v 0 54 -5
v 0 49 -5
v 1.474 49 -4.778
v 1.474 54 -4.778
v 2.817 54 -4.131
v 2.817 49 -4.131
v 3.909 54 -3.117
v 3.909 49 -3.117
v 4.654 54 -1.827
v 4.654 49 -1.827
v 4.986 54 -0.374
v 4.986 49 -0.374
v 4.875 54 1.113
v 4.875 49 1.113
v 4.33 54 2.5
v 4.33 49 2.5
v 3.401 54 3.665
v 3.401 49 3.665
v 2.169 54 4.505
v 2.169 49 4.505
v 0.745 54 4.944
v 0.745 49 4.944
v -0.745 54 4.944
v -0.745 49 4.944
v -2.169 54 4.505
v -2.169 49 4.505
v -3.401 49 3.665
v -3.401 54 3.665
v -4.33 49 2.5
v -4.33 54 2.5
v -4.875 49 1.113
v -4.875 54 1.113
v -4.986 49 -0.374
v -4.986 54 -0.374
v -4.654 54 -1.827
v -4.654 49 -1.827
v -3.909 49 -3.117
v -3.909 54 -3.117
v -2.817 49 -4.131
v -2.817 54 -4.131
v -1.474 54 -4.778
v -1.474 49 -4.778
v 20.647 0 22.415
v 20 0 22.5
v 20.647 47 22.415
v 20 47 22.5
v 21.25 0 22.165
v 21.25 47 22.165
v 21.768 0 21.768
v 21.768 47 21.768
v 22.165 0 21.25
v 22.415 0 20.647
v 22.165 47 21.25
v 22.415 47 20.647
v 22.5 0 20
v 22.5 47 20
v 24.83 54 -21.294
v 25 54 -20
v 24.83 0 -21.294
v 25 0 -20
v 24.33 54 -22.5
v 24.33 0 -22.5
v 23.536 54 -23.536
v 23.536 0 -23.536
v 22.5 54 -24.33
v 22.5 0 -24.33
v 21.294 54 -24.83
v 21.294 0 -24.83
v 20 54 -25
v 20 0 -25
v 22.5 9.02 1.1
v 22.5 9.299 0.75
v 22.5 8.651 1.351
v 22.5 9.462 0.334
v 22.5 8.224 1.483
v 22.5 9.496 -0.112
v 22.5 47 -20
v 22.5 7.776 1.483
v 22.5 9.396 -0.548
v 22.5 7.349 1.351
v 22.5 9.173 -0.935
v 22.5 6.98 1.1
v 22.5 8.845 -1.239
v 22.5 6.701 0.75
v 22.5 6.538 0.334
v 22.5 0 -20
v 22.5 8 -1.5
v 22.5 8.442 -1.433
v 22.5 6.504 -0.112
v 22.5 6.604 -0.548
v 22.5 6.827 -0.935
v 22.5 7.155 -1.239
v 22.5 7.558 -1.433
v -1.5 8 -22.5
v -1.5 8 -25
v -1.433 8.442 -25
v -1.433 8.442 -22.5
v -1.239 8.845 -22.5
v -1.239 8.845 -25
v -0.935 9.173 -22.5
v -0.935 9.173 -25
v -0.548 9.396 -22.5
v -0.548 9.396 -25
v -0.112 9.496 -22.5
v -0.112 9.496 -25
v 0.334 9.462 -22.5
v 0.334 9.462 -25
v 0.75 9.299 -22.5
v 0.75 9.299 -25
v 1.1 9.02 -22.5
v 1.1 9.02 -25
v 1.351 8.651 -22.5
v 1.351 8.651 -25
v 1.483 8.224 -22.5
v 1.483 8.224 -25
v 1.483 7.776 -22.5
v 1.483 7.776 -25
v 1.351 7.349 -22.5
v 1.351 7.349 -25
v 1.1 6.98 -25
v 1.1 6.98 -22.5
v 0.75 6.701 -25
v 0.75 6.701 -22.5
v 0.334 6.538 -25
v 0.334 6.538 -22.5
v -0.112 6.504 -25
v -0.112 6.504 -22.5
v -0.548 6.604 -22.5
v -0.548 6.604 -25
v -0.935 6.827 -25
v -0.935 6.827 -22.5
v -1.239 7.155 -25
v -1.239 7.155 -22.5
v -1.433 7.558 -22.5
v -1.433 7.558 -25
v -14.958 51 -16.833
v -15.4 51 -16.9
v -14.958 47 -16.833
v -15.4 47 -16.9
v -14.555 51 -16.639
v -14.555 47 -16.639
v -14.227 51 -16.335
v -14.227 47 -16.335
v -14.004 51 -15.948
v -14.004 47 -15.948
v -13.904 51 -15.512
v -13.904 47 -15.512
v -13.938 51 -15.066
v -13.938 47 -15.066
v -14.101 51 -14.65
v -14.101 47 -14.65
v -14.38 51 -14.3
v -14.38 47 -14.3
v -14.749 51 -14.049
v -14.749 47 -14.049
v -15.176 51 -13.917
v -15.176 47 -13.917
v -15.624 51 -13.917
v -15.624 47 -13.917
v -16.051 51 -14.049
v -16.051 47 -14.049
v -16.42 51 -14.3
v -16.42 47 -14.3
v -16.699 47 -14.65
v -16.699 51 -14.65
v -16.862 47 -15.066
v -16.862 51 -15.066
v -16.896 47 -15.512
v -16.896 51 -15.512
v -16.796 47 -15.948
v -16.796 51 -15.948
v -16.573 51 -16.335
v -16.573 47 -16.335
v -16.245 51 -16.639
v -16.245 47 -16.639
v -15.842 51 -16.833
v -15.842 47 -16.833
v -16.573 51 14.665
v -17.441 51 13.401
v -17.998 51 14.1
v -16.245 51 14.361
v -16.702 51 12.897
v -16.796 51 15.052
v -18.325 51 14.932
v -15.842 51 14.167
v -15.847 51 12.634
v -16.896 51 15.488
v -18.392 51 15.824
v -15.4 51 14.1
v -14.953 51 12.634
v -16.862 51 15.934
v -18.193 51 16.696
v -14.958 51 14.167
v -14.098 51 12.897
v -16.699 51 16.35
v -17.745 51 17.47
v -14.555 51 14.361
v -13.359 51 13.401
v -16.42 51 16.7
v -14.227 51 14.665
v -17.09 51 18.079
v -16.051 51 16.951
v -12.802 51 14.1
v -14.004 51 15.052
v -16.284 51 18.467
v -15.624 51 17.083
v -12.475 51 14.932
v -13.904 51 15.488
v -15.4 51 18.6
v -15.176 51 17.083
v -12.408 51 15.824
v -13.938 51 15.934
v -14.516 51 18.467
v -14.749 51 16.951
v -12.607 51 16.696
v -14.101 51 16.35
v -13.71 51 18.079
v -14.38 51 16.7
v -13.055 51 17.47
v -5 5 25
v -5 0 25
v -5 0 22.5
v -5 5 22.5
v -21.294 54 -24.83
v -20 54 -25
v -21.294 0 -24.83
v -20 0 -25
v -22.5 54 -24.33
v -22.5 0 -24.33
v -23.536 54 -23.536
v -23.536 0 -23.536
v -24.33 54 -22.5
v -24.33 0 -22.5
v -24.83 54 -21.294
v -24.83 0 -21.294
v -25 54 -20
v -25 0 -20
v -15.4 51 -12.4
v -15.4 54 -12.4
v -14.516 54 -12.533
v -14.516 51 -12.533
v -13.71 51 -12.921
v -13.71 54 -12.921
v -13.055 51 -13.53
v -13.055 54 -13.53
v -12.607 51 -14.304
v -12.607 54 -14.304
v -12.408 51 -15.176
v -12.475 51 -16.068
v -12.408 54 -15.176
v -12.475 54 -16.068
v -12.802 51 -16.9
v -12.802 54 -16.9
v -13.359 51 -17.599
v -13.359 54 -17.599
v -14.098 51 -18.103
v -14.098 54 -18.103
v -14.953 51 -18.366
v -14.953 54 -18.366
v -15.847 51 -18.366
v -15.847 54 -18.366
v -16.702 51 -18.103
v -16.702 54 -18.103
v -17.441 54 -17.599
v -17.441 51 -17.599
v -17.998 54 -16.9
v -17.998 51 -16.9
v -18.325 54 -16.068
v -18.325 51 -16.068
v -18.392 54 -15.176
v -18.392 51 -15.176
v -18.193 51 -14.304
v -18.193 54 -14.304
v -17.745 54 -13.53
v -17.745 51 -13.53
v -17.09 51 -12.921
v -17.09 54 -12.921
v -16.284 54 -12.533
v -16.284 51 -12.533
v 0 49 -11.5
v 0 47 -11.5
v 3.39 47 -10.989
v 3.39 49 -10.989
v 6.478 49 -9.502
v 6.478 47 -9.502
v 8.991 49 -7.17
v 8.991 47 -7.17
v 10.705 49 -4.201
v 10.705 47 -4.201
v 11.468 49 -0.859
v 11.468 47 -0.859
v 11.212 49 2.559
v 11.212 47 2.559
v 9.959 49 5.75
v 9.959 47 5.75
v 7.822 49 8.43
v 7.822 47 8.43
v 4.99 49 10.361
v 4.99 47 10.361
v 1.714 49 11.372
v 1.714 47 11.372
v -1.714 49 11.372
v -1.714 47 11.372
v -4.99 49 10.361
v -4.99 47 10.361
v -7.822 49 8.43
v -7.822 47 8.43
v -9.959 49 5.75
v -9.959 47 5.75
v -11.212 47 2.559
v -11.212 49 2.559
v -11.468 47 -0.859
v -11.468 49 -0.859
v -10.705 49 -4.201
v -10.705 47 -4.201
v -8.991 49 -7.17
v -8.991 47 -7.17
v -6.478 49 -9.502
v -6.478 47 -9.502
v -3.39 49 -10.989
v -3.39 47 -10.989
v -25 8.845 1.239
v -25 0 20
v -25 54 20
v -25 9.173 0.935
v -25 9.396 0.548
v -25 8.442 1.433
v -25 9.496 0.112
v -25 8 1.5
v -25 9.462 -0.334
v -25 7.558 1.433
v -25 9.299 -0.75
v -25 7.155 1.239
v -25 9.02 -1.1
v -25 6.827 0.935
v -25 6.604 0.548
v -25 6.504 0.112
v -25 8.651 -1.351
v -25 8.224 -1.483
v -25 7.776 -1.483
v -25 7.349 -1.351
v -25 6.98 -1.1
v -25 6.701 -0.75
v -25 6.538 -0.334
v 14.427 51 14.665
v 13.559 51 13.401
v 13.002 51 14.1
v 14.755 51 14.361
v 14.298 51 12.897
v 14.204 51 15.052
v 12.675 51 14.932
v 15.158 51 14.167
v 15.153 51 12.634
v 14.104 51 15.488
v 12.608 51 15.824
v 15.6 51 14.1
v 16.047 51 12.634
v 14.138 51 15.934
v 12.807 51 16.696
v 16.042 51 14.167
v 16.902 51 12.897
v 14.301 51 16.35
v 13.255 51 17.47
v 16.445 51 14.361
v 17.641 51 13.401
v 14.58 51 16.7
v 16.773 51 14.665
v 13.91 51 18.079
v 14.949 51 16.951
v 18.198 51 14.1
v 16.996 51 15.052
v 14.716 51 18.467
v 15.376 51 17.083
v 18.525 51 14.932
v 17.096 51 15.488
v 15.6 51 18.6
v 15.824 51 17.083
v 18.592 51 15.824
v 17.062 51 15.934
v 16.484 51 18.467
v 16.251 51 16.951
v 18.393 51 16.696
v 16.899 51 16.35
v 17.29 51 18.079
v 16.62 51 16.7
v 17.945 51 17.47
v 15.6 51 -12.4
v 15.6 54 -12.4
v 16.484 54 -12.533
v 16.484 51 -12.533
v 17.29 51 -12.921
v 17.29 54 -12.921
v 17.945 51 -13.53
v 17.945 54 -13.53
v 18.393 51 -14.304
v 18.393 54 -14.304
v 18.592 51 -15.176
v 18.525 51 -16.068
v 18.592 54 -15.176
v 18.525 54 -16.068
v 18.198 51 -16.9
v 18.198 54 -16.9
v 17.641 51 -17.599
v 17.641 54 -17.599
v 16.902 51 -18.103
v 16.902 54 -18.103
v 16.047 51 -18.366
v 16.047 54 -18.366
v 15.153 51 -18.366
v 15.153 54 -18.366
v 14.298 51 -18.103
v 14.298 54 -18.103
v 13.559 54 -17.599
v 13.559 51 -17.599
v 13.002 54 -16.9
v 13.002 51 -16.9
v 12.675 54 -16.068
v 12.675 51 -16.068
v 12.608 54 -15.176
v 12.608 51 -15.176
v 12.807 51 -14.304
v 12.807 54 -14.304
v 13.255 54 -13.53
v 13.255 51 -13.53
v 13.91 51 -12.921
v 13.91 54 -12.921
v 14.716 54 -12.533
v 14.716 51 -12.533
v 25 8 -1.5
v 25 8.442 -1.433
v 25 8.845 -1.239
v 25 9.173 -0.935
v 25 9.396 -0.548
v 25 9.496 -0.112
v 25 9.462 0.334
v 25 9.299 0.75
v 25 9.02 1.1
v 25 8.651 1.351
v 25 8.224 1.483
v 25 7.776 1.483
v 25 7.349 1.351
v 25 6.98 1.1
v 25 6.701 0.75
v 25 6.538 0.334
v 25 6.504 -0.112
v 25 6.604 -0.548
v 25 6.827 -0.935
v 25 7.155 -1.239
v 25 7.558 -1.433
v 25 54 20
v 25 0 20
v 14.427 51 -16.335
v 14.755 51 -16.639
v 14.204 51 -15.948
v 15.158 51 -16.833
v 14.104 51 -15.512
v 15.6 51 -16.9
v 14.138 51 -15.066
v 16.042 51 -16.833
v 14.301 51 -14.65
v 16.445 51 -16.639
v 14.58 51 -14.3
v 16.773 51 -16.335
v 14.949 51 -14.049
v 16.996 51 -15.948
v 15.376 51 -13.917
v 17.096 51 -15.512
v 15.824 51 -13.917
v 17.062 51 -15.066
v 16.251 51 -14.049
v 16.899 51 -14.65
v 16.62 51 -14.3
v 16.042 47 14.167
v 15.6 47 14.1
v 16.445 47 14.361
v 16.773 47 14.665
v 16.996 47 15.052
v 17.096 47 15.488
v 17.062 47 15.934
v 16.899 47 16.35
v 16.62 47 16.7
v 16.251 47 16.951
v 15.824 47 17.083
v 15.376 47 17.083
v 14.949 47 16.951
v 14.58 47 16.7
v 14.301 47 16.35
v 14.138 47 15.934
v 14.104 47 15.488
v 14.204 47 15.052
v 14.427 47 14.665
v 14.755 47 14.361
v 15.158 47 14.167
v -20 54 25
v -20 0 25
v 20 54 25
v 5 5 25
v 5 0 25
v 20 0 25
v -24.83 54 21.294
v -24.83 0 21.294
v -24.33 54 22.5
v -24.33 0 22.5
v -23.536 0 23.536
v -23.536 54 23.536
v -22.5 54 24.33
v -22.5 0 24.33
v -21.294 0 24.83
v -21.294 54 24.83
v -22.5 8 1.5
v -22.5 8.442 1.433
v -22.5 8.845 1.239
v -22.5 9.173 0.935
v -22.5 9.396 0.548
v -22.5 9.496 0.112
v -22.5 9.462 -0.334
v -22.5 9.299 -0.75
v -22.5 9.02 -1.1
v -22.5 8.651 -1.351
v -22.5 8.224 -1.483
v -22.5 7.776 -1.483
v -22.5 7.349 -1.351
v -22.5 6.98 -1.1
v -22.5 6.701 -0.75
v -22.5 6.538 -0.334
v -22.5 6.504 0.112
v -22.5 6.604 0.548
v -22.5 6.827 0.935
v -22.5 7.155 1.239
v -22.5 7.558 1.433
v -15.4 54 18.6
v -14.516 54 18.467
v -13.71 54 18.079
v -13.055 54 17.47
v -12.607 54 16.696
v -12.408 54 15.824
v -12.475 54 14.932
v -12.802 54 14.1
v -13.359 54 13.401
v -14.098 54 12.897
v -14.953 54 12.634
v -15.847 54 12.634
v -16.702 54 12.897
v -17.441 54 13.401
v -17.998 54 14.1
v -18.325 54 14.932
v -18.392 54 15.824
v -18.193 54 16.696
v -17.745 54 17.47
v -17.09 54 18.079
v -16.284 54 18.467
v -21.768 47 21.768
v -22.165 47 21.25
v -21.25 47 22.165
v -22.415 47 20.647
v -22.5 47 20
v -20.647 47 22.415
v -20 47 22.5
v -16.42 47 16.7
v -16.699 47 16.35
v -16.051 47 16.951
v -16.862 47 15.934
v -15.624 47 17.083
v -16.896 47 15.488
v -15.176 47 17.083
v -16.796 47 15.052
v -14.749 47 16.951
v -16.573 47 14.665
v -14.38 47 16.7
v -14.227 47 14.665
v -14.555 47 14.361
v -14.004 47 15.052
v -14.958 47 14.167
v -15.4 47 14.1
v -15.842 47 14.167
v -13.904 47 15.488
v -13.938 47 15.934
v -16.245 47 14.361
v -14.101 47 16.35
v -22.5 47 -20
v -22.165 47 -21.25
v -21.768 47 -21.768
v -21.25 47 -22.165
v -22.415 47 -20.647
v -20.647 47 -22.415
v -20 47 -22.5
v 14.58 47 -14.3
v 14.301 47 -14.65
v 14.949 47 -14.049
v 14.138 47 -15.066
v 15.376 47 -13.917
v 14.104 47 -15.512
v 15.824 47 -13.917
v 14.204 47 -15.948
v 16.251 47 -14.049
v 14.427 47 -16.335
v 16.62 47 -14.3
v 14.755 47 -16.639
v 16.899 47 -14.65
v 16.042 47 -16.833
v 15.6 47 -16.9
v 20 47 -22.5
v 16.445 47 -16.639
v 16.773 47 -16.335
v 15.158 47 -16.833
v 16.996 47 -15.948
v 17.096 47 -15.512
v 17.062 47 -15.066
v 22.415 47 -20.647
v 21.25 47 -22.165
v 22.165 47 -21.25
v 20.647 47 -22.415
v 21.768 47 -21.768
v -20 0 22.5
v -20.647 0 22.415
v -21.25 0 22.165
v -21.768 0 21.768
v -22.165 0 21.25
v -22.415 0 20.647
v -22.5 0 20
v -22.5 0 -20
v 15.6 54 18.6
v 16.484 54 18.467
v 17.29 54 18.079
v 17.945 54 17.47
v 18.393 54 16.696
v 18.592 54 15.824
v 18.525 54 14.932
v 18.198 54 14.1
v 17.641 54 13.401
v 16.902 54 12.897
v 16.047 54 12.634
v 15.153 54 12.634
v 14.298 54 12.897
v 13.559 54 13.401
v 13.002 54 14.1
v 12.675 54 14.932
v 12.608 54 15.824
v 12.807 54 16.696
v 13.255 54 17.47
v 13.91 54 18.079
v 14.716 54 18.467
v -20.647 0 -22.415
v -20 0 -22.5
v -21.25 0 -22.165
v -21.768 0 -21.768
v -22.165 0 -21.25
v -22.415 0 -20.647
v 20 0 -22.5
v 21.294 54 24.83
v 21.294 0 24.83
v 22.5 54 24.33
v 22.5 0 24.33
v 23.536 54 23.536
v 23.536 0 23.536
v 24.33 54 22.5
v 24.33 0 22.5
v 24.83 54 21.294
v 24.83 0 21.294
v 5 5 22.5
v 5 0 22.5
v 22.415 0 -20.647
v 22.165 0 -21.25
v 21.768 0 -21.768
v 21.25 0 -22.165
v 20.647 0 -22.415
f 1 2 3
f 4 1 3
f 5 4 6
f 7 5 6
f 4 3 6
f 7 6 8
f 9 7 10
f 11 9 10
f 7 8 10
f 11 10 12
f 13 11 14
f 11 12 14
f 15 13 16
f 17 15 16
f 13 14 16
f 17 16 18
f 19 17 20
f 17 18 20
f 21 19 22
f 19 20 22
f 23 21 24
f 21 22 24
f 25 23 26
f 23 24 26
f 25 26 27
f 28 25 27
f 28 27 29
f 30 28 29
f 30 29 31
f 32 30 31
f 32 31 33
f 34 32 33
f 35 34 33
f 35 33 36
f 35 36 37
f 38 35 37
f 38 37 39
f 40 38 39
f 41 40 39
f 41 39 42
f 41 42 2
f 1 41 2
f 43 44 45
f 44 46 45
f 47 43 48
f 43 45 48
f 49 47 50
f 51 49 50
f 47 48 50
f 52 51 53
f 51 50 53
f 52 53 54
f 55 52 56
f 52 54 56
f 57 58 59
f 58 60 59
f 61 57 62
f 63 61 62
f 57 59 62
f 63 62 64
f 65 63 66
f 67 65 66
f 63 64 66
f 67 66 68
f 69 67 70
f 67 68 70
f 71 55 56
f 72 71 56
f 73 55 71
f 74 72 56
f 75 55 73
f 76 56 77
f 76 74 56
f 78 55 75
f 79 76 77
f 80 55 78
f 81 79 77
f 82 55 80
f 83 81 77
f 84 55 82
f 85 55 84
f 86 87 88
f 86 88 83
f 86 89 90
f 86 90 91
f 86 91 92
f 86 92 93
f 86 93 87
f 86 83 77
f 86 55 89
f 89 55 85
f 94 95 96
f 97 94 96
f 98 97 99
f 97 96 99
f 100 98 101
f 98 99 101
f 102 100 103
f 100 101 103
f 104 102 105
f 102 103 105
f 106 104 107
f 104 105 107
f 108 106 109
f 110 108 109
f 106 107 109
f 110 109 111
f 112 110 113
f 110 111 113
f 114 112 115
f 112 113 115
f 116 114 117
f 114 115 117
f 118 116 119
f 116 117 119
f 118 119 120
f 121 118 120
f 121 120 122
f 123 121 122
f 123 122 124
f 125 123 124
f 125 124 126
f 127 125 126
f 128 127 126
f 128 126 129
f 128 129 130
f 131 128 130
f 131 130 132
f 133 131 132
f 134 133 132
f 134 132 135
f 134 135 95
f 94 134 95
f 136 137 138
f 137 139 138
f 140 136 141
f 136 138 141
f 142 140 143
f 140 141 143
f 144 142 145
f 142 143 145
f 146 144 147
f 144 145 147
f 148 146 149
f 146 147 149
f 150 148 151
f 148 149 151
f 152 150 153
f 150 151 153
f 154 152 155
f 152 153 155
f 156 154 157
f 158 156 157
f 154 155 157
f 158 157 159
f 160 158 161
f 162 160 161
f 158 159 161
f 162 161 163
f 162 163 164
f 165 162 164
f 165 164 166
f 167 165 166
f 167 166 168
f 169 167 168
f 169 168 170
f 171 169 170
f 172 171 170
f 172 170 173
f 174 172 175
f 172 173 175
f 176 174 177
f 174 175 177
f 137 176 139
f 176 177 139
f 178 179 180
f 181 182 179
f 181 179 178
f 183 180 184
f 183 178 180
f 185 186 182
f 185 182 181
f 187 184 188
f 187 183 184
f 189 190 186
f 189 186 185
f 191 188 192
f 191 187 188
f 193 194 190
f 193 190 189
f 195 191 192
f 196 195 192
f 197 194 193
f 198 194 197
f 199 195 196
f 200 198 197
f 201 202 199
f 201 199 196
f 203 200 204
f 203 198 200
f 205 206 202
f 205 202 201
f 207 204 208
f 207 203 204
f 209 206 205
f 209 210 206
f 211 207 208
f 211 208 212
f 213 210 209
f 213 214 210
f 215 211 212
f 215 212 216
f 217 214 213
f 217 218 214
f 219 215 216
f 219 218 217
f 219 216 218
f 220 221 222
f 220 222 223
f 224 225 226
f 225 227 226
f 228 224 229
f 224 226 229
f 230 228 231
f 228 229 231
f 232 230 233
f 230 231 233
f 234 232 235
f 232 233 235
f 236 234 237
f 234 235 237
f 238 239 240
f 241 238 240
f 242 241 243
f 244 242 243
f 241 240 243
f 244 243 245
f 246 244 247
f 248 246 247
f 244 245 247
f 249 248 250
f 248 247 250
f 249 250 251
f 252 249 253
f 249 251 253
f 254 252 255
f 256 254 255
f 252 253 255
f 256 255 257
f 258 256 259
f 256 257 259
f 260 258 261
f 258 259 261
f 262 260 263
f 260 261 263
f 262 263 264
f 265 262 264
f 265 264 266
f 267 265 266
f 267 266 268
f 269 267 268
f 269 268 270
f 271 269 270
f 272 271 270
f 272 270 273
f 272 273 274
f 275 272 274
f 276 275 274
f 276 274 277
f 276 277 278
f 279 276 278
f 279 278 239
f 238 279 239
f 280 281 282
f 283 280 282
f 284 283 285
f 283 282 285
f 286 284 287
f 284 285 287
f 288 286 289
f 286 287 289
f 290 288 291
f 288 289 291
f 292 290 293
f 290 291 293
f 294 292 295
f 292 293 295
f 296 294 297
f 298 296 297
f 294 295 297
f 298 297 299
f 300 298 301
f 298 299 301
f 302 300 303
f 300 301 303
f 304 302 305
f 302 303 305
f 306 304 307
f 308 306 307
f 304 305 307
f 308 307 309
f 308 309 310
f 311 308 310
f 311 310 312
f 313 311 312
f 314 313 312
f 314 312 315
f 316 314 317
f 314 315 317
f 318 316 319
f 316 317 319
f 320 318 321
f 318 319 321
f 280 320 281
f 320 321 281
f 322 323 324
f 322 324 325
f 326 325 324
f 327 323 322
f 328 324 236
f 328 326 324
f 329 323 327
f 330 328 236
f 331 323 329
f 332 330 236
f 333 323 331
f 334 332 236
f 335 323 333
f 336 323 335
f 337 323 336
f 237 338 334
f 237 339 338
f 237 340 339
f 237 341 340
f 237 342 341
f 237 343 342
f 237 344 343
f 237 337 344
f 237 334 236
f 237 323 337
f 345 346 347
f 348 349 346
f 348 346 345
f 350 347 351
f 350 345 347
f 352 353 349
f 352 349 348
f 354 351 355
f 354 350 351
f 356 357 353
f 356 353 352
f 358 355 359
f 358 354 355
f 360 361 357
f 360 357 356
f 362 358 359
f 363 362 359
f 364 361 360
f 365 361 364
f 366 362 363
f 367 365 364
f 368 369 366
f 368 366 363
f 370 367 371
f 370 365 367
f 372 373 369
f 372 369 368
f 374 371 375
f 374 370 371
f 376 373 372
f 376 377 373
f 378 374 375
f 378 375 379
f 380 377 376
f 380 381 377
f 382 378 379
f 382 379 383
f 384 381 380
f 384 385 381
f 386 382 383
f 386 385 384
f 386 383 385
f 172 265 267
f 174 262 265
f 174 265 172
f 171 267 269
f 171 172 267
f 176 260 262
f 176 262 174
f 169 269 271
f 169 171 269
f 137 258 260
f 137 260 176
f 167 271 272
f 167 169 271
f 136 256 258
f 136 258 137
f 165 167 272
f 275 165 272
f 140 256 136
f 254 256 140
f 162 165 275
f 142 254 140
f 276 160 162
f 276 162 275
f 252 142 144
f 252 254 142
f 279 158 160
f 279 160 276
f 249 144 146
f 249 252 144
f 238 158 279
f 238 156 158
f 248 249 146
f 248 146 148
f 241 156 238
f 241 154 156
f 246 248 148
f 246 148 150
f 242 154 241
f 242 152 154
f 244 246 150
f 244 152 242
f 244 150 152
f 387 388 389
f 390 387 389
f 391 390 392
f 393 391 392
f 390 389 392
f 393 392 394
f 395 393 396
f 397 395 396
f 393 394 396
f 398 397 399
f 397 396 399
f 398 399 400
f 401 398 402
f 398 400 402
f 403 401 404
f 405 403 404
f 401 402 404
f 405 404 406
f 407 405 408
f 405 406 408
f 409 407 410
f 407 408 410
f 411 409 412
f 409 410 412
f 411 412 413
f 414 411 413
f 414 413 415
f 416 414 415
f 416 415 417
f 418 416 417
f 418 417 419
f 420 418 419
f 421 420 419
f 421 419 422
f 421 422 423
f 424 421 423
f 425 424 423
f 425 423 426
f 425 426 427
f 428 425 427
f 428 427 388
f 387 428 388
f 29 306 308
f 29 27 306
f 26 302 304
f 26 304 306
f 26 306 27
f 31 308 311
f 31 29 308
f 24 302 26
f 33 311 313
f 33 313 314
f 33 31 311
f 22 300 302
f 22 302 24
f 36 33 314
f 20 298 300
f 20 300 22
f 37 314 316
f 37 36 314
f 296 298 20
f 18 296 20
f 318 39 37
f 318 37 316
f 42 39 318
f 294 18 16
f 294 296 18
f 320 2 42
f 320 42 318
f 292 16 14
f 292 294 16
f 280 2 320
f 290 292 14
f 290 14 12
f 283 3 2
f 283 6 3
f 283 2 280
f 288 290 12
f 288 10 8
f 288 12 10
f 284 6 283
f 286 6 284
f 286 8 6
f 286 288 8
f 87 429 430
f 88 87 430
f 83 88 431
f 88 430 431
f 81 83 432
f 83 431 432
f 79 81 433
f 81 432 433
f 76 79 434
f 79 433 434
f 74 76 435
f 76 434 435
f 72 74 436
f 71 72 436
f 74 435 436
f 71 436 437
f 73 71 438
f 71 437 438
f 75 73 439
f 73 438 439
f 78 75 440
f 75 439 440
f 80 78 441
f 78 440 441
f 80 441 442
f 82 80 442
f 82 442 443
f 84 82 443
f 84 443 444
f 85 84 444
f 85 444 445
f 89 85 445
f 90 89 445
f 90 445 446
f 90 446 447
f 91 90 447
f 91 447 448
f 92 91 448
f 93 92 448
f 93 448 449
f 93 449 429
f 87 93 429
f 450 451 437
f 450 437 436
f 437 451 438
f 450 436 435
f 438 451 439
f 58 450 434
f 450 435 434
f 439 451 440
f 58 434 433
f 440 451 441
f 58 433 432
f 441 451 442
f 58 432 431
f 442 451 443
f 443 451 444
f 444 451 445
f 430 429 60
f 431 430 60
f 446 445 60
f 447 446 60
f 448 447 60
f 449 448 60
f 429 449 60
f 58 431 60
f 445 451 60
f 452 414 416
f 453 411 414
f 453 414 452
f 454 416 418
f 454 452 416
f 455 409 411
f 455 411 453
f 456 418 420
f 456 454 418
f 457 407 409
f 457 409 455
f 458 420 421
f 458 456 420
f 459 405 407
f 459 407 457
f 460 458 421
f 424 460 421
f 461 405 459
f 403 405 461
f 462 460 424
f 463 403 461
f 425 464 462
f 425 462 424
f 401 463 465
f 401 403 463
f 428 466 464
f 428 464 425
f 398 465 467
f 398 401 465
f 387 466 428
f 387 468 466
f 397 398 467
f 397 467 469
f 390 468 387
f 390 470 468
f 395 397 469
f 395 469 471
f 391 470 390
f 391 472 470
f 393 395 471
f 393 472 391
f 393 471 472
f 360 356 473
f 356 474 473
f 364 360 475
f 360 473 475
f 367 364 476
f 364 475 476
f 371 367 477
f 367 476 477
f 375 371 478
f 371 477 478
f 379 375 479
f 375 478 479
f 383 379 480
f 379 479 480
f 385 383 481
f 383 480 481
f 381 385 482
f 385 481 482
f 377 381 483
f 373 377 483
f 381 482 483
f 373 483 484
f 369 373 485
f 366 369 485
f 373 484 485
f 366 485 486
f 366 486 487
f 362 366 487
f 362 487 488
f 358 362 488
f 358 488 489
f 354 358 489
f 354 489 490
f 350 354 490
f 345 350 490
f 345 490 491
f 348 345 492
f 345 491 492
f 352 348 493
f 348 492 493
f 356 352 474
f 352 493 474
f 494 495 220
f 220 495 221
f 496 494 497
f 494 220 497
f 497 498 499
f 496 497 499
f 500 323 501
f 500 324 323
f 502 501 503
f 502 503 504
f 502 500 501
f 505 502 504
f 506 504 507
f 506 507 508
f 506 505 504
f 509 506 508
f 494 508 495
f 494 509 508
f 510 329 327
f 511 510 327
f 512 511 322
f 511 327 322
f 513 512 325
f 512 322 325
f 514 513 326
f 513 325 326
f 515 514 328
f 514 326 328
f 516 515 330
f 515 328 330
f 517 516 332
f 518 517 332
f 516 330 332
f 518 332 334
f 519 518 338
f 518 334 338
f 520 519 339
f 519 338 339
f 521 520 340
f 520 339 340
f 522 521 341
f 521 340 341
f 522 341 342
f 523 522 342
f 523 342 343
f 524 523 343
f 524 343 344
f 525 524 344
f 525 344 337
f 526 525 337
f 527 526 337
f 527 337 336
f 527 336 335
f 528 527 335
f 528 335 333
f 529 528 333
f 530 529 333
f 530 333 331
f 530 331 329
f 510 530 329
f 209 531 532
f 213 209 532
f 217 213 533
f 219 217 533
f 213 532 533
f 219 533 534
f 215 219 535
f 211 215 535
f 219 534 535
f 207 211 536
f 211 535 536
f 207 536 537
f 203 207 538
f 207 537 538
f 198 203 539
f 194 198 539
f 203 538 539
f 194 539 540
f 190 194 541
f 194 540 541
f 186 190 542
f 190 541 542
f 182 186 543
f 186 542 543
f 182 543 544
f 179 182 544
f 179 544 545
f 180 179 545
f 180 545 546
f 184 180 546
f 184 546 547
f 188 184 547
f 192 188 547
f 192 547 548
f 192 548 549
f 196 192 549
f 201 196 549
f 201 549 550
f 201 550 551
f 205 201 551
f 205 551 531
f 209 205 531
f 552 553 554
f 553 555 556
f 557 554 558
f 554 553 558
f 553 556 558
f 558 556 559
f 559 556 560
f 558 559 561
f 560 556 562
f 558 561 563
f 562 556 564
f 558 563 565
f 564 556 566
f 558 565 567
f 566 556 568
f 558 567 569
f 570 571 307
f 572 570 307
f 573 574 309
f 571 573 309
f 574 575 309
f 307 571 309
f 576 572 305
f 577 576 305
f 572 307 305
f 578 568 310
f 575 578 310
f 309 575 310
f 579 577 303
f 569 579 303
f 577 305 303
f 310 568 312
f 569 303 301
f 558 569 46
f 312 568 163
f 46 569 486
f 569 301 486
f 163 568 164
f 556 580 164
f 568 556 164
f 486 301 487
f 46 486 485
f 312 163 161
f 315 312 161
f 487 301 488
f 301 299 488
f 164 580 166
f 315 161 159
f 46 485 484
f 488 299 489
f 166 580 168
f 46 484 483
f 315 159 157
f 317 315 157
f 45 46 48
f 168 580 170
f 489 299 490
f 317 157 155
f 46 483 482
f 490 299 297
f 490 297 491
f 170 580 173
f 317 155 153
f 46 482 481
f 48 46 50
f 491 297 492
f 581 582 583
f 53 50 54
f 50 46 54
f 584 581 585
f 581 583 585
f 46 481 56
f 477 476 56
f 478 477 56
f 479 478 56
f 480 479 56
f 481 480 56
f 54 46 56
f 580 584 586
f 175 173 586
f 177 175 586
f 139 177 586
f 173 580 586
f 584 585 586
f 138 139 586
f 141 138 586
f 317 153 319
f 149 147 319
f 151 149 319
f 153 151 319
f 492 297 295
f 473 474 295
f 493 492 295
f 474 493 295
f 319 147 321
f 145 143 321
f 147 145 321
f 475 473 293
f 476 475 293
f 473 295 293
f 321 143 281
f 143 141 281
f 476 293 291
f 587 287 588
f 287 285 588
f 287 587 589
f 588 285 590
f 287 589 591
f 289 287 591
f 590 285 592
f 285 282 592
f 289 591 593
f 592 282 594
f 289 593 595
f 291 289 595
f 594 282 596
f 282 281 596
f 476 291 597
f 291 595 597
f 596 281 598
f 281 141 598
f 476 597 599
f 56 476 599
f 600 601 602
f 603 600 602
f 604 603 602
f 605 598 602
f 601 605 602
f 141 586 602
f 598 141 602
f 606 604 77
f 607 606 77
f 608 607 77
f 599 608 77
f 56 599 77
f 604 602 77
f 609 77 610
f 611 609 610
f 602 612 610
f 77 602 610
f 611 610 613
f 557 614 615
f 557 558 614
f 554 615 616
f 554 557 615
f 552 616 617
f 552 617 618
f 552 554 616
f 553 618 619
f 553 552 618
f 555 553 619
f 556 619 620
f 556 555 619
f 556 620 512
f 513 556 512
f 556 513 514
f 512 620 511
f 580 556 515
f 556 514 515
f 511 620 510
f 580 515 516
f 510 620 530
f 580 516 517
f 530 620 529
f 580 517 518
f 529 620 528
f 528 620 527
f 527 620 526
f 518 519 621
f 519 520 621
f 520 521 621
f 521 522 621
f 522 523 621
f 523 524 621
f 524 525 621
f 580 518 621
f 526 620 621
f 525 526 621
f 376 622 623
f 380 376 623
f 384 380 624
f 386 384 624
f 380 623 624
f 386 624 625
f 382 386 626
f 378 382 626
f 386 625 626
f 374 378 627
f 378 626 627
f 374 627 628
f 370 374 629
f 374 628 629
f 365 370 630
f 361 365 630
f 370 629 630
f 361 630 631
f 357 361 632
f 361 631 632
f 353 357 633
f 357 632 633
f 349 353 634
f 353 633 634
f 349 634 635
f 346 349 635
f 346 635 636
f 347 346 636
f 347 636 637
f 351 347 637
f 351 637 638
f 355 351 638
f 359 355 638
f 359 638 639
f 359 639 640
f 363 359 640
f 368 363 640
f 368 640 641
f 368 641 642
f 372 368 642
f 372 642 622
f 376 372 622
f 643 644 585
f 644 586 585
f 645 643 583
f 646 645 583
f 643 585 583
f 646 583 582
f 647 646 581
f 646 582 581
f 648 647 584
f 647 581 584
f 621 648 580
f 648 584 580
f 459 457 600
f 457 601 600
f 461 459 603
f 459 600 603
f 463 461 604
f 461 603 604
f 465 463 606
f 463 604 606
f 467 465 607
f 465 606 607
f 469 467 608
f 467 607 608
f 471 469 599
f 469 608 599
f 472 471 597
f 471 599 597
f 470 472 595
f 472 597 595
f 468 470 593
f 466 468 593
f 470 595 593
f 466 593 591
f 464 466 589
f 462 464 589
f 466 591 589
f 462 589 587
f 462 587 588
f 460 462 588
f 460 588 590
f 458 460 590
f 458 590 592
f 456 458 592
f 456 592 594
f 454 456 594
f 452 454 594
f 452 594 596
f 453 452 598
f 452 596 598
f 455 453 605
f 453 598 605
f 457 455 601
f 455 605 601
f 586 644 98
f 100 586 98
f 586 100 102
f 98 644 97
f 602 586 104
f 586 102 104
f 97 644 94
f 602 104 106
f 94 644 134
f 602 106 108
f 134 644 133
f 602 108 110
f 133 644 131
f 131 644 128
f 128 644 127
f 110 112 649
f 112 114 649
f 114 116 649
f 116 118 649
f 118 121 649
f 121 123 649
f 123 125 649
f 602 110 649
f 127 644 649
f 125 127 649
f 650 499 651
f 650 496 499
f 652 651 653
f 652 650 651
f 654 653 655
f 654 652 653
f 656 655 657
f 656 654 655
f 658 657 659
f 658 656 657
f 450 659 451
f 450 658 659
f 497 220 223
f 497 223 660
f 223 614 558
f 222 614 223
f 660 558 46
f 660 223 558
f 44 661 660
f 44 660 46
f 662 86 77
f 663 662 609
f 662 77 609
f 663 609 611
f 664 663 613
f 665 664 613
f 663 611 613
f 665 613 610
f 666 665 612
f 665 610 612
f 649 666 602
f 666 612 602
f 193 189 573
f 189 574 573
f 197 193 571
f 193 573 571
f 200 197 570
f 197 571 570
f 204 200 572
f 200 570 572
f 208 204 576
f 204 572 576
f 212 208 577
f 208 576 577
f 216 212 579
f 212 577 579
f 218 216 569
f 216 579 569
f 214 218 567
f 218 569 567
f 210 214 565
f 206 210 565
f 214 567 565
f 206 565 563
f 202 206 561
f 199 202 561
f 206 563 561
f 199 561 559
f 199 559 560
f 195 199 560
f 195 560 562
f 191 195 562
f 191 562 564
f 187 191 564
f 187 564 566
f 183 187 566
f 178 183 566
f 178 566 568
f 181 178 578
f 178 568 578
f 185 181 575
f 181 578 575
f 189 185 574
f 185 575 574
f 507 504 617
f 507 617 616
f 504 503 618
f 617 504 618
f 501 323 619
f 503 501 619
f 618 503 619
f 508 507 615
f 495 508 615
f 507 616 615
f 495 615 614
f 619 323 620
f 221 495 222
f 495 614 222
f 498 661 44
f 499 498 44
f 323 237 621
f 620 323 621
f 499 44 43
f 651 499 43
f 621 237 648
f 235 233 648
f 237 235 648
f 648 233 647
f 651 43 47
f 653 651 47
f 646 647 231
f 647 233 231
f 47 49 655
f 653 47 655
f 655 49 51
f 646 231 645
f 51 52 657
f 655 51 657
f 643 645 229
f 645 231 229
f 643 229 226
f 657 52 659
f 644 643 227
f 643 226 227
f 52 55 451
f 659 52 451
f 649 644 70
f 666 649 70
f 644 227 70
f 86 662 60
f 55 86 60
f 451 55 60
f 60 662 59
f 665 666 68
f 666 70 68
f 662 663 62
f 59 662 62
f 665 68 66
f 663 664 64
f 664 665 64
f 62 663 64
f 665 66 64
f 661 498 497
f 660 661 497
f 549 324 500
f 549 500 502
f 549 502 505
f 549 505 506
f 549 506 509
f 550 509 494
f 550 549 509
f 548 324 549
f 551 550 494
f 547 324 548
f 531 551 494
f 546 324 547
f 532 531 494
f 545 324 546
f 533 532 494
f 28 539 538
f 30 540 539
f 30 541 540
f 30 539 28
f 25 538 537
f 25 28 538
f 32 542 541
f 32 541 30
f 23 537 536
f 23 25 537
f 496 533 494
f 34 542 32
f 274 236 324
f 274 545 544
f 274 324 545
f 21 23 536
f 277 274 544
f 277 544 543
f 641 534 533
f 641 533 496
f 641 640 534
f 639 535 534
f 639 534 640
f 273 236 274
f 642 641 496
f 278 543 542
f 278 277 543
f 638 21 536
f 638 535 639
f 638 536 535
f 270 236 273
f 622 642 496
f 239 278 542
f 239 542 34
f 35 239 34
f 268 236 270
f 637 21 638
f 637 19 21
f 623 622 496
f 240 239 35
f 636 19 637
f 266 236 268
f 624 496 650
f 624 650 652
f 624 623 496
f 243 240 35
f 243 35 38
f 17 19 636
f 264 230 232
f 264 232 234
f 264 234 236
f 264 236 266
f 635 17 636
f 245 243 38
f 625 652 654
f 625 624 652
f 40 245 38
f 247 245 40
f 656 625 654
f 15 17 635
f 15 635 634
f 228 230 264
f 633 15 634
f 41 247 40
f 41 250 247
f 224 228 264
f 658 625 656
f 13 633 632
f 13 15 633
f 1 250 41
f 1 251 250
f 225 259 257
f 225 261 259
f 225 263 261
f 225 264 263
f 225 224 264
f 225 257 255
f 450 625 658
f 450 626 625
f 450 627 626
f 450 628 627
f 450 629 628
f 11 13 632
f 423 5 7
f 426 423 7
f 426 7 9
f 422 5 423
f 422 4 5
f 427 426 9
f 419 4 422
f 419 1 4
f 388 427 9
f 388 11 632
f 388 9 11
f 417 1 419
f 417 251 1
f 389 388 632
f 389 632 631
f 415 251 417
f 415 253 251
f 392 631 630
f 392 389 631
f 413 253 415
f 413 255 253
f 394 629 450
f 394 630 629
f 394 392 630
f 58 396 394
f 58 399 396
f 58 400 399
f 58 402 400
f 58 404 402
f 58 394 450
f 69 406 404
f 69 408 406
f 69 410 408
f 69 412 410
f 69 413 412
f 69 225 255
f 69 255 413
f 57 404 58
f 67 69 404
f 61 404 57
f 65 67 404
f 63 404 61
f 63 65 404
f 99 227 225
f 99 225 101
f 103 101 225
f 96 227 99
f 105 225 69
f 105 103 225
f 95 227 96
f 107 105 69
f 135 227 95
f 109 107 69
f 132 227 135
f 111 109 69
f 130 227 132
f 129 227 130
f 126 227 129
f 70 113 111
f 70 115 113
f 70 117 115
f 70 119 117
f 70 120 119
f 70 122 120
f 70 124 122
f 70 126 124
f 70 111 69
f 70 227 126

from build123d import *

# Parameters (mm, degrees)
SKETCH1_W           = 50
SKETCH1_H           = 50
SKETCH1_W_2         = 45
SKETCH1_H_2         = 45
BOSS_EXTRUDE1_DEPTH = 47
SKETCH3_W           = 50
SKETCH3_H           = 50
BOSS_EXTRUDE3_DEPTH = 7
SKETCH5_R           = 11.5
CUT_EXTRUDE1_DEPTH  = 2
SKETCH6_R           = 5
CUT_EXTRUDE2_DEPTH  = 61.42350536
FILLET2_R           = 5
FILLET3_R           = 5
FILLET4_R           = 5
FILLET5_R           = 5
FILLET7_R           = 2.5
FILLET8_R           = 2.5
FILLET9_R           = 2.5
FILLET10_R          = 2.5
SKETCH9_W           = 10
SKETCH9_H           = 5
CUT_EXTRUDE5_DEPTH  = 13
SKETCH10_R          = 1.5
CUT_EXTRUDE6_DEPTH  = 10
CIRPATTERN1_COUNT   = 4
HOLE1_D             = 3
HOLE1_DEPTH         = 12
HOLE1_CBORE_D       = 6
HOLE1_CBORE_DEPTH   = 3


with BuildPart() as part:
    # Sketch1 → Boss-Extrude1 (new body)
    with BuildSketch(Plane(origin=(0, 0, 0), x_dir=(1, 0, 0), z_dir=(0, 1, 0))):
        Rectangle(SKETCH1_W, SKETCH1_H)
        Rectangle(SKETCH1_W_2, SKETCH1_H_2, mode=Mode.SUBTRACT)
    extrude(amount=BOSS_EXTRUDE1_DEPTH)

    # Sketch3 → Boss-Extrude3 (add)
    with BuildSketch(Plane(origin=(0, 47, 0), x_dir=(1, 0, 0), z_dir=(0, 1, 0))):
        Rectangle(SKETCH3_W, SKETCH3_H)
    extrude(amount=BOSS_EXTRUDE3_DEPTH)

    # Sketch5 → Cut-Extrude1 (cut)
    with BuildSketch(Plane.XZ.offset(-47)):
        with Locations(Location((0, 0, 0), (0, 0, 270))):
            Circle(SKETCH5_R)
    extrude(amount=-CUT_EXTRUDE1_DEPTH, mode=Mode.SUBTRACT)

    # Sketch6 → Cut-Extrude2 (cut, through all)
    with BuildSketch(Plane.XZ.offset(-49)):
        with Locations(Location((0, 0, 0), (0, 0, 270))):
            Circle(SKETCH6_R)
    extrude(amount=-CUT_EXTRUDE2_DEPTH, mode=Mode.SUBTRACT)

    # Fillet2
    fillet2_edges = [part.edges().sort_by_distance(p)[0] for p in [
        (25, 27, 25),
    ]]
    fillet(fillet2_edges, radius=FILLET2_R)

    # Fillet3
    fillet3_edges = [part.edges().sort_by_distance(p)[0] for p in [
        (25, 27, -25),
    ]]
    fillet(fillet3_edges, radius=FILLET3_R)

    # Fillet4
    fillet4_edges = [part.edges().sort_by_distance(p)[0] for p in [
        (-25, 27, -25),
    ]]
    fillet(fillet4_edges, radius=FILLET4_R)

    # Fillet5
    fillet5_edges = [part.edges().sort_by_distance(p)[0] for p in [
        (-25, 27, 25),
    ]]
    fillet(fillet5_edges, radius=FILLET5_R)

    # Fillet7
    fillet7_edges = [part.edges().sort_by_distance(p)[0] for p in [
        (-22.5, 23.5, 22.5),
    ]]
    fillet(fillet7_edges, radius=FILLET7_R)

    # Fillet8
    fillet8_edges = [part.edges().sort_by_distance(p)[0] for p in [
        (22.5, 23.5, 22.5),
    ]]
    fillet(fillet8_edges, radius=FILLET8_R)

    # Fillet9
    fillet9_edges = [part.edges().sort_by_distance(p)[0] for p in [
        (22.5, 23.5, -22.5),
    ]]
    fillet(fillet9_edges, radius=FILLET9_R)

    # Fillet10
    fillet10_edges = [part.edges().sort_by_distance(p)[0] for p in [
        (-22.5, 23.5, -22.5),
    ]]
    fillet(fillet10_edges, radius=FILLET10_R)

    # Sketch9 → Cut-Extrude5 (cut)
    with BuildSketch(Plane.XY.offset(25)):
        with Locations((0, 2.5)):
            Rectangle(SKETCH9_W, SKETCH9_H)
    extrude(amount=-CUT_EXTRUDE5_DEPTH, mode=Mode.SUBTRACT)

    # Sketch10 → Cut-Extrude6 (cut)
    with BuildSketch(Plane(origin=(25, 0, 0), x_dir=(0, 0, -1), z_dir=(1, 0, 0))):
        with Locations((0, 8)):
            Circle(SKETCH10_R)
    cut_extrude6 = extrude(amount=-CUT_EXTRUDE6_DEPTH, mode=Mode.SUBTRACT)

    # CirPattern1: Cut-Extrude6 ×4 about axis, 1 skipped
    cirpattern1_axis = Axis((0, 54, 0), (0, -1, 0))
    add([cut_extrude6.rotate(cirpattern1_axis, i * 360 / CIRPATTERN1_COUNT) for i in range(1, CIRPATTERN1_COUNT) if i not in (1,)], mode=Mode.SUBTRACT)

    # Hole1
    with Locations(Plane(origin=(-15.4, 54, -15.4), x_dir=(0, 0, 1), z_dir=(0, 1, 0))):
        with Locations((0, 0), (0, 31), (31, 31), (31, 0)):
            CounterBoreHole(HOLE1_D / 2, HOLE1_CBORE_D / 2, HOLE1_CBORE_DEPTH, depth=HOLE1_DEPTH)


solid = part.part
